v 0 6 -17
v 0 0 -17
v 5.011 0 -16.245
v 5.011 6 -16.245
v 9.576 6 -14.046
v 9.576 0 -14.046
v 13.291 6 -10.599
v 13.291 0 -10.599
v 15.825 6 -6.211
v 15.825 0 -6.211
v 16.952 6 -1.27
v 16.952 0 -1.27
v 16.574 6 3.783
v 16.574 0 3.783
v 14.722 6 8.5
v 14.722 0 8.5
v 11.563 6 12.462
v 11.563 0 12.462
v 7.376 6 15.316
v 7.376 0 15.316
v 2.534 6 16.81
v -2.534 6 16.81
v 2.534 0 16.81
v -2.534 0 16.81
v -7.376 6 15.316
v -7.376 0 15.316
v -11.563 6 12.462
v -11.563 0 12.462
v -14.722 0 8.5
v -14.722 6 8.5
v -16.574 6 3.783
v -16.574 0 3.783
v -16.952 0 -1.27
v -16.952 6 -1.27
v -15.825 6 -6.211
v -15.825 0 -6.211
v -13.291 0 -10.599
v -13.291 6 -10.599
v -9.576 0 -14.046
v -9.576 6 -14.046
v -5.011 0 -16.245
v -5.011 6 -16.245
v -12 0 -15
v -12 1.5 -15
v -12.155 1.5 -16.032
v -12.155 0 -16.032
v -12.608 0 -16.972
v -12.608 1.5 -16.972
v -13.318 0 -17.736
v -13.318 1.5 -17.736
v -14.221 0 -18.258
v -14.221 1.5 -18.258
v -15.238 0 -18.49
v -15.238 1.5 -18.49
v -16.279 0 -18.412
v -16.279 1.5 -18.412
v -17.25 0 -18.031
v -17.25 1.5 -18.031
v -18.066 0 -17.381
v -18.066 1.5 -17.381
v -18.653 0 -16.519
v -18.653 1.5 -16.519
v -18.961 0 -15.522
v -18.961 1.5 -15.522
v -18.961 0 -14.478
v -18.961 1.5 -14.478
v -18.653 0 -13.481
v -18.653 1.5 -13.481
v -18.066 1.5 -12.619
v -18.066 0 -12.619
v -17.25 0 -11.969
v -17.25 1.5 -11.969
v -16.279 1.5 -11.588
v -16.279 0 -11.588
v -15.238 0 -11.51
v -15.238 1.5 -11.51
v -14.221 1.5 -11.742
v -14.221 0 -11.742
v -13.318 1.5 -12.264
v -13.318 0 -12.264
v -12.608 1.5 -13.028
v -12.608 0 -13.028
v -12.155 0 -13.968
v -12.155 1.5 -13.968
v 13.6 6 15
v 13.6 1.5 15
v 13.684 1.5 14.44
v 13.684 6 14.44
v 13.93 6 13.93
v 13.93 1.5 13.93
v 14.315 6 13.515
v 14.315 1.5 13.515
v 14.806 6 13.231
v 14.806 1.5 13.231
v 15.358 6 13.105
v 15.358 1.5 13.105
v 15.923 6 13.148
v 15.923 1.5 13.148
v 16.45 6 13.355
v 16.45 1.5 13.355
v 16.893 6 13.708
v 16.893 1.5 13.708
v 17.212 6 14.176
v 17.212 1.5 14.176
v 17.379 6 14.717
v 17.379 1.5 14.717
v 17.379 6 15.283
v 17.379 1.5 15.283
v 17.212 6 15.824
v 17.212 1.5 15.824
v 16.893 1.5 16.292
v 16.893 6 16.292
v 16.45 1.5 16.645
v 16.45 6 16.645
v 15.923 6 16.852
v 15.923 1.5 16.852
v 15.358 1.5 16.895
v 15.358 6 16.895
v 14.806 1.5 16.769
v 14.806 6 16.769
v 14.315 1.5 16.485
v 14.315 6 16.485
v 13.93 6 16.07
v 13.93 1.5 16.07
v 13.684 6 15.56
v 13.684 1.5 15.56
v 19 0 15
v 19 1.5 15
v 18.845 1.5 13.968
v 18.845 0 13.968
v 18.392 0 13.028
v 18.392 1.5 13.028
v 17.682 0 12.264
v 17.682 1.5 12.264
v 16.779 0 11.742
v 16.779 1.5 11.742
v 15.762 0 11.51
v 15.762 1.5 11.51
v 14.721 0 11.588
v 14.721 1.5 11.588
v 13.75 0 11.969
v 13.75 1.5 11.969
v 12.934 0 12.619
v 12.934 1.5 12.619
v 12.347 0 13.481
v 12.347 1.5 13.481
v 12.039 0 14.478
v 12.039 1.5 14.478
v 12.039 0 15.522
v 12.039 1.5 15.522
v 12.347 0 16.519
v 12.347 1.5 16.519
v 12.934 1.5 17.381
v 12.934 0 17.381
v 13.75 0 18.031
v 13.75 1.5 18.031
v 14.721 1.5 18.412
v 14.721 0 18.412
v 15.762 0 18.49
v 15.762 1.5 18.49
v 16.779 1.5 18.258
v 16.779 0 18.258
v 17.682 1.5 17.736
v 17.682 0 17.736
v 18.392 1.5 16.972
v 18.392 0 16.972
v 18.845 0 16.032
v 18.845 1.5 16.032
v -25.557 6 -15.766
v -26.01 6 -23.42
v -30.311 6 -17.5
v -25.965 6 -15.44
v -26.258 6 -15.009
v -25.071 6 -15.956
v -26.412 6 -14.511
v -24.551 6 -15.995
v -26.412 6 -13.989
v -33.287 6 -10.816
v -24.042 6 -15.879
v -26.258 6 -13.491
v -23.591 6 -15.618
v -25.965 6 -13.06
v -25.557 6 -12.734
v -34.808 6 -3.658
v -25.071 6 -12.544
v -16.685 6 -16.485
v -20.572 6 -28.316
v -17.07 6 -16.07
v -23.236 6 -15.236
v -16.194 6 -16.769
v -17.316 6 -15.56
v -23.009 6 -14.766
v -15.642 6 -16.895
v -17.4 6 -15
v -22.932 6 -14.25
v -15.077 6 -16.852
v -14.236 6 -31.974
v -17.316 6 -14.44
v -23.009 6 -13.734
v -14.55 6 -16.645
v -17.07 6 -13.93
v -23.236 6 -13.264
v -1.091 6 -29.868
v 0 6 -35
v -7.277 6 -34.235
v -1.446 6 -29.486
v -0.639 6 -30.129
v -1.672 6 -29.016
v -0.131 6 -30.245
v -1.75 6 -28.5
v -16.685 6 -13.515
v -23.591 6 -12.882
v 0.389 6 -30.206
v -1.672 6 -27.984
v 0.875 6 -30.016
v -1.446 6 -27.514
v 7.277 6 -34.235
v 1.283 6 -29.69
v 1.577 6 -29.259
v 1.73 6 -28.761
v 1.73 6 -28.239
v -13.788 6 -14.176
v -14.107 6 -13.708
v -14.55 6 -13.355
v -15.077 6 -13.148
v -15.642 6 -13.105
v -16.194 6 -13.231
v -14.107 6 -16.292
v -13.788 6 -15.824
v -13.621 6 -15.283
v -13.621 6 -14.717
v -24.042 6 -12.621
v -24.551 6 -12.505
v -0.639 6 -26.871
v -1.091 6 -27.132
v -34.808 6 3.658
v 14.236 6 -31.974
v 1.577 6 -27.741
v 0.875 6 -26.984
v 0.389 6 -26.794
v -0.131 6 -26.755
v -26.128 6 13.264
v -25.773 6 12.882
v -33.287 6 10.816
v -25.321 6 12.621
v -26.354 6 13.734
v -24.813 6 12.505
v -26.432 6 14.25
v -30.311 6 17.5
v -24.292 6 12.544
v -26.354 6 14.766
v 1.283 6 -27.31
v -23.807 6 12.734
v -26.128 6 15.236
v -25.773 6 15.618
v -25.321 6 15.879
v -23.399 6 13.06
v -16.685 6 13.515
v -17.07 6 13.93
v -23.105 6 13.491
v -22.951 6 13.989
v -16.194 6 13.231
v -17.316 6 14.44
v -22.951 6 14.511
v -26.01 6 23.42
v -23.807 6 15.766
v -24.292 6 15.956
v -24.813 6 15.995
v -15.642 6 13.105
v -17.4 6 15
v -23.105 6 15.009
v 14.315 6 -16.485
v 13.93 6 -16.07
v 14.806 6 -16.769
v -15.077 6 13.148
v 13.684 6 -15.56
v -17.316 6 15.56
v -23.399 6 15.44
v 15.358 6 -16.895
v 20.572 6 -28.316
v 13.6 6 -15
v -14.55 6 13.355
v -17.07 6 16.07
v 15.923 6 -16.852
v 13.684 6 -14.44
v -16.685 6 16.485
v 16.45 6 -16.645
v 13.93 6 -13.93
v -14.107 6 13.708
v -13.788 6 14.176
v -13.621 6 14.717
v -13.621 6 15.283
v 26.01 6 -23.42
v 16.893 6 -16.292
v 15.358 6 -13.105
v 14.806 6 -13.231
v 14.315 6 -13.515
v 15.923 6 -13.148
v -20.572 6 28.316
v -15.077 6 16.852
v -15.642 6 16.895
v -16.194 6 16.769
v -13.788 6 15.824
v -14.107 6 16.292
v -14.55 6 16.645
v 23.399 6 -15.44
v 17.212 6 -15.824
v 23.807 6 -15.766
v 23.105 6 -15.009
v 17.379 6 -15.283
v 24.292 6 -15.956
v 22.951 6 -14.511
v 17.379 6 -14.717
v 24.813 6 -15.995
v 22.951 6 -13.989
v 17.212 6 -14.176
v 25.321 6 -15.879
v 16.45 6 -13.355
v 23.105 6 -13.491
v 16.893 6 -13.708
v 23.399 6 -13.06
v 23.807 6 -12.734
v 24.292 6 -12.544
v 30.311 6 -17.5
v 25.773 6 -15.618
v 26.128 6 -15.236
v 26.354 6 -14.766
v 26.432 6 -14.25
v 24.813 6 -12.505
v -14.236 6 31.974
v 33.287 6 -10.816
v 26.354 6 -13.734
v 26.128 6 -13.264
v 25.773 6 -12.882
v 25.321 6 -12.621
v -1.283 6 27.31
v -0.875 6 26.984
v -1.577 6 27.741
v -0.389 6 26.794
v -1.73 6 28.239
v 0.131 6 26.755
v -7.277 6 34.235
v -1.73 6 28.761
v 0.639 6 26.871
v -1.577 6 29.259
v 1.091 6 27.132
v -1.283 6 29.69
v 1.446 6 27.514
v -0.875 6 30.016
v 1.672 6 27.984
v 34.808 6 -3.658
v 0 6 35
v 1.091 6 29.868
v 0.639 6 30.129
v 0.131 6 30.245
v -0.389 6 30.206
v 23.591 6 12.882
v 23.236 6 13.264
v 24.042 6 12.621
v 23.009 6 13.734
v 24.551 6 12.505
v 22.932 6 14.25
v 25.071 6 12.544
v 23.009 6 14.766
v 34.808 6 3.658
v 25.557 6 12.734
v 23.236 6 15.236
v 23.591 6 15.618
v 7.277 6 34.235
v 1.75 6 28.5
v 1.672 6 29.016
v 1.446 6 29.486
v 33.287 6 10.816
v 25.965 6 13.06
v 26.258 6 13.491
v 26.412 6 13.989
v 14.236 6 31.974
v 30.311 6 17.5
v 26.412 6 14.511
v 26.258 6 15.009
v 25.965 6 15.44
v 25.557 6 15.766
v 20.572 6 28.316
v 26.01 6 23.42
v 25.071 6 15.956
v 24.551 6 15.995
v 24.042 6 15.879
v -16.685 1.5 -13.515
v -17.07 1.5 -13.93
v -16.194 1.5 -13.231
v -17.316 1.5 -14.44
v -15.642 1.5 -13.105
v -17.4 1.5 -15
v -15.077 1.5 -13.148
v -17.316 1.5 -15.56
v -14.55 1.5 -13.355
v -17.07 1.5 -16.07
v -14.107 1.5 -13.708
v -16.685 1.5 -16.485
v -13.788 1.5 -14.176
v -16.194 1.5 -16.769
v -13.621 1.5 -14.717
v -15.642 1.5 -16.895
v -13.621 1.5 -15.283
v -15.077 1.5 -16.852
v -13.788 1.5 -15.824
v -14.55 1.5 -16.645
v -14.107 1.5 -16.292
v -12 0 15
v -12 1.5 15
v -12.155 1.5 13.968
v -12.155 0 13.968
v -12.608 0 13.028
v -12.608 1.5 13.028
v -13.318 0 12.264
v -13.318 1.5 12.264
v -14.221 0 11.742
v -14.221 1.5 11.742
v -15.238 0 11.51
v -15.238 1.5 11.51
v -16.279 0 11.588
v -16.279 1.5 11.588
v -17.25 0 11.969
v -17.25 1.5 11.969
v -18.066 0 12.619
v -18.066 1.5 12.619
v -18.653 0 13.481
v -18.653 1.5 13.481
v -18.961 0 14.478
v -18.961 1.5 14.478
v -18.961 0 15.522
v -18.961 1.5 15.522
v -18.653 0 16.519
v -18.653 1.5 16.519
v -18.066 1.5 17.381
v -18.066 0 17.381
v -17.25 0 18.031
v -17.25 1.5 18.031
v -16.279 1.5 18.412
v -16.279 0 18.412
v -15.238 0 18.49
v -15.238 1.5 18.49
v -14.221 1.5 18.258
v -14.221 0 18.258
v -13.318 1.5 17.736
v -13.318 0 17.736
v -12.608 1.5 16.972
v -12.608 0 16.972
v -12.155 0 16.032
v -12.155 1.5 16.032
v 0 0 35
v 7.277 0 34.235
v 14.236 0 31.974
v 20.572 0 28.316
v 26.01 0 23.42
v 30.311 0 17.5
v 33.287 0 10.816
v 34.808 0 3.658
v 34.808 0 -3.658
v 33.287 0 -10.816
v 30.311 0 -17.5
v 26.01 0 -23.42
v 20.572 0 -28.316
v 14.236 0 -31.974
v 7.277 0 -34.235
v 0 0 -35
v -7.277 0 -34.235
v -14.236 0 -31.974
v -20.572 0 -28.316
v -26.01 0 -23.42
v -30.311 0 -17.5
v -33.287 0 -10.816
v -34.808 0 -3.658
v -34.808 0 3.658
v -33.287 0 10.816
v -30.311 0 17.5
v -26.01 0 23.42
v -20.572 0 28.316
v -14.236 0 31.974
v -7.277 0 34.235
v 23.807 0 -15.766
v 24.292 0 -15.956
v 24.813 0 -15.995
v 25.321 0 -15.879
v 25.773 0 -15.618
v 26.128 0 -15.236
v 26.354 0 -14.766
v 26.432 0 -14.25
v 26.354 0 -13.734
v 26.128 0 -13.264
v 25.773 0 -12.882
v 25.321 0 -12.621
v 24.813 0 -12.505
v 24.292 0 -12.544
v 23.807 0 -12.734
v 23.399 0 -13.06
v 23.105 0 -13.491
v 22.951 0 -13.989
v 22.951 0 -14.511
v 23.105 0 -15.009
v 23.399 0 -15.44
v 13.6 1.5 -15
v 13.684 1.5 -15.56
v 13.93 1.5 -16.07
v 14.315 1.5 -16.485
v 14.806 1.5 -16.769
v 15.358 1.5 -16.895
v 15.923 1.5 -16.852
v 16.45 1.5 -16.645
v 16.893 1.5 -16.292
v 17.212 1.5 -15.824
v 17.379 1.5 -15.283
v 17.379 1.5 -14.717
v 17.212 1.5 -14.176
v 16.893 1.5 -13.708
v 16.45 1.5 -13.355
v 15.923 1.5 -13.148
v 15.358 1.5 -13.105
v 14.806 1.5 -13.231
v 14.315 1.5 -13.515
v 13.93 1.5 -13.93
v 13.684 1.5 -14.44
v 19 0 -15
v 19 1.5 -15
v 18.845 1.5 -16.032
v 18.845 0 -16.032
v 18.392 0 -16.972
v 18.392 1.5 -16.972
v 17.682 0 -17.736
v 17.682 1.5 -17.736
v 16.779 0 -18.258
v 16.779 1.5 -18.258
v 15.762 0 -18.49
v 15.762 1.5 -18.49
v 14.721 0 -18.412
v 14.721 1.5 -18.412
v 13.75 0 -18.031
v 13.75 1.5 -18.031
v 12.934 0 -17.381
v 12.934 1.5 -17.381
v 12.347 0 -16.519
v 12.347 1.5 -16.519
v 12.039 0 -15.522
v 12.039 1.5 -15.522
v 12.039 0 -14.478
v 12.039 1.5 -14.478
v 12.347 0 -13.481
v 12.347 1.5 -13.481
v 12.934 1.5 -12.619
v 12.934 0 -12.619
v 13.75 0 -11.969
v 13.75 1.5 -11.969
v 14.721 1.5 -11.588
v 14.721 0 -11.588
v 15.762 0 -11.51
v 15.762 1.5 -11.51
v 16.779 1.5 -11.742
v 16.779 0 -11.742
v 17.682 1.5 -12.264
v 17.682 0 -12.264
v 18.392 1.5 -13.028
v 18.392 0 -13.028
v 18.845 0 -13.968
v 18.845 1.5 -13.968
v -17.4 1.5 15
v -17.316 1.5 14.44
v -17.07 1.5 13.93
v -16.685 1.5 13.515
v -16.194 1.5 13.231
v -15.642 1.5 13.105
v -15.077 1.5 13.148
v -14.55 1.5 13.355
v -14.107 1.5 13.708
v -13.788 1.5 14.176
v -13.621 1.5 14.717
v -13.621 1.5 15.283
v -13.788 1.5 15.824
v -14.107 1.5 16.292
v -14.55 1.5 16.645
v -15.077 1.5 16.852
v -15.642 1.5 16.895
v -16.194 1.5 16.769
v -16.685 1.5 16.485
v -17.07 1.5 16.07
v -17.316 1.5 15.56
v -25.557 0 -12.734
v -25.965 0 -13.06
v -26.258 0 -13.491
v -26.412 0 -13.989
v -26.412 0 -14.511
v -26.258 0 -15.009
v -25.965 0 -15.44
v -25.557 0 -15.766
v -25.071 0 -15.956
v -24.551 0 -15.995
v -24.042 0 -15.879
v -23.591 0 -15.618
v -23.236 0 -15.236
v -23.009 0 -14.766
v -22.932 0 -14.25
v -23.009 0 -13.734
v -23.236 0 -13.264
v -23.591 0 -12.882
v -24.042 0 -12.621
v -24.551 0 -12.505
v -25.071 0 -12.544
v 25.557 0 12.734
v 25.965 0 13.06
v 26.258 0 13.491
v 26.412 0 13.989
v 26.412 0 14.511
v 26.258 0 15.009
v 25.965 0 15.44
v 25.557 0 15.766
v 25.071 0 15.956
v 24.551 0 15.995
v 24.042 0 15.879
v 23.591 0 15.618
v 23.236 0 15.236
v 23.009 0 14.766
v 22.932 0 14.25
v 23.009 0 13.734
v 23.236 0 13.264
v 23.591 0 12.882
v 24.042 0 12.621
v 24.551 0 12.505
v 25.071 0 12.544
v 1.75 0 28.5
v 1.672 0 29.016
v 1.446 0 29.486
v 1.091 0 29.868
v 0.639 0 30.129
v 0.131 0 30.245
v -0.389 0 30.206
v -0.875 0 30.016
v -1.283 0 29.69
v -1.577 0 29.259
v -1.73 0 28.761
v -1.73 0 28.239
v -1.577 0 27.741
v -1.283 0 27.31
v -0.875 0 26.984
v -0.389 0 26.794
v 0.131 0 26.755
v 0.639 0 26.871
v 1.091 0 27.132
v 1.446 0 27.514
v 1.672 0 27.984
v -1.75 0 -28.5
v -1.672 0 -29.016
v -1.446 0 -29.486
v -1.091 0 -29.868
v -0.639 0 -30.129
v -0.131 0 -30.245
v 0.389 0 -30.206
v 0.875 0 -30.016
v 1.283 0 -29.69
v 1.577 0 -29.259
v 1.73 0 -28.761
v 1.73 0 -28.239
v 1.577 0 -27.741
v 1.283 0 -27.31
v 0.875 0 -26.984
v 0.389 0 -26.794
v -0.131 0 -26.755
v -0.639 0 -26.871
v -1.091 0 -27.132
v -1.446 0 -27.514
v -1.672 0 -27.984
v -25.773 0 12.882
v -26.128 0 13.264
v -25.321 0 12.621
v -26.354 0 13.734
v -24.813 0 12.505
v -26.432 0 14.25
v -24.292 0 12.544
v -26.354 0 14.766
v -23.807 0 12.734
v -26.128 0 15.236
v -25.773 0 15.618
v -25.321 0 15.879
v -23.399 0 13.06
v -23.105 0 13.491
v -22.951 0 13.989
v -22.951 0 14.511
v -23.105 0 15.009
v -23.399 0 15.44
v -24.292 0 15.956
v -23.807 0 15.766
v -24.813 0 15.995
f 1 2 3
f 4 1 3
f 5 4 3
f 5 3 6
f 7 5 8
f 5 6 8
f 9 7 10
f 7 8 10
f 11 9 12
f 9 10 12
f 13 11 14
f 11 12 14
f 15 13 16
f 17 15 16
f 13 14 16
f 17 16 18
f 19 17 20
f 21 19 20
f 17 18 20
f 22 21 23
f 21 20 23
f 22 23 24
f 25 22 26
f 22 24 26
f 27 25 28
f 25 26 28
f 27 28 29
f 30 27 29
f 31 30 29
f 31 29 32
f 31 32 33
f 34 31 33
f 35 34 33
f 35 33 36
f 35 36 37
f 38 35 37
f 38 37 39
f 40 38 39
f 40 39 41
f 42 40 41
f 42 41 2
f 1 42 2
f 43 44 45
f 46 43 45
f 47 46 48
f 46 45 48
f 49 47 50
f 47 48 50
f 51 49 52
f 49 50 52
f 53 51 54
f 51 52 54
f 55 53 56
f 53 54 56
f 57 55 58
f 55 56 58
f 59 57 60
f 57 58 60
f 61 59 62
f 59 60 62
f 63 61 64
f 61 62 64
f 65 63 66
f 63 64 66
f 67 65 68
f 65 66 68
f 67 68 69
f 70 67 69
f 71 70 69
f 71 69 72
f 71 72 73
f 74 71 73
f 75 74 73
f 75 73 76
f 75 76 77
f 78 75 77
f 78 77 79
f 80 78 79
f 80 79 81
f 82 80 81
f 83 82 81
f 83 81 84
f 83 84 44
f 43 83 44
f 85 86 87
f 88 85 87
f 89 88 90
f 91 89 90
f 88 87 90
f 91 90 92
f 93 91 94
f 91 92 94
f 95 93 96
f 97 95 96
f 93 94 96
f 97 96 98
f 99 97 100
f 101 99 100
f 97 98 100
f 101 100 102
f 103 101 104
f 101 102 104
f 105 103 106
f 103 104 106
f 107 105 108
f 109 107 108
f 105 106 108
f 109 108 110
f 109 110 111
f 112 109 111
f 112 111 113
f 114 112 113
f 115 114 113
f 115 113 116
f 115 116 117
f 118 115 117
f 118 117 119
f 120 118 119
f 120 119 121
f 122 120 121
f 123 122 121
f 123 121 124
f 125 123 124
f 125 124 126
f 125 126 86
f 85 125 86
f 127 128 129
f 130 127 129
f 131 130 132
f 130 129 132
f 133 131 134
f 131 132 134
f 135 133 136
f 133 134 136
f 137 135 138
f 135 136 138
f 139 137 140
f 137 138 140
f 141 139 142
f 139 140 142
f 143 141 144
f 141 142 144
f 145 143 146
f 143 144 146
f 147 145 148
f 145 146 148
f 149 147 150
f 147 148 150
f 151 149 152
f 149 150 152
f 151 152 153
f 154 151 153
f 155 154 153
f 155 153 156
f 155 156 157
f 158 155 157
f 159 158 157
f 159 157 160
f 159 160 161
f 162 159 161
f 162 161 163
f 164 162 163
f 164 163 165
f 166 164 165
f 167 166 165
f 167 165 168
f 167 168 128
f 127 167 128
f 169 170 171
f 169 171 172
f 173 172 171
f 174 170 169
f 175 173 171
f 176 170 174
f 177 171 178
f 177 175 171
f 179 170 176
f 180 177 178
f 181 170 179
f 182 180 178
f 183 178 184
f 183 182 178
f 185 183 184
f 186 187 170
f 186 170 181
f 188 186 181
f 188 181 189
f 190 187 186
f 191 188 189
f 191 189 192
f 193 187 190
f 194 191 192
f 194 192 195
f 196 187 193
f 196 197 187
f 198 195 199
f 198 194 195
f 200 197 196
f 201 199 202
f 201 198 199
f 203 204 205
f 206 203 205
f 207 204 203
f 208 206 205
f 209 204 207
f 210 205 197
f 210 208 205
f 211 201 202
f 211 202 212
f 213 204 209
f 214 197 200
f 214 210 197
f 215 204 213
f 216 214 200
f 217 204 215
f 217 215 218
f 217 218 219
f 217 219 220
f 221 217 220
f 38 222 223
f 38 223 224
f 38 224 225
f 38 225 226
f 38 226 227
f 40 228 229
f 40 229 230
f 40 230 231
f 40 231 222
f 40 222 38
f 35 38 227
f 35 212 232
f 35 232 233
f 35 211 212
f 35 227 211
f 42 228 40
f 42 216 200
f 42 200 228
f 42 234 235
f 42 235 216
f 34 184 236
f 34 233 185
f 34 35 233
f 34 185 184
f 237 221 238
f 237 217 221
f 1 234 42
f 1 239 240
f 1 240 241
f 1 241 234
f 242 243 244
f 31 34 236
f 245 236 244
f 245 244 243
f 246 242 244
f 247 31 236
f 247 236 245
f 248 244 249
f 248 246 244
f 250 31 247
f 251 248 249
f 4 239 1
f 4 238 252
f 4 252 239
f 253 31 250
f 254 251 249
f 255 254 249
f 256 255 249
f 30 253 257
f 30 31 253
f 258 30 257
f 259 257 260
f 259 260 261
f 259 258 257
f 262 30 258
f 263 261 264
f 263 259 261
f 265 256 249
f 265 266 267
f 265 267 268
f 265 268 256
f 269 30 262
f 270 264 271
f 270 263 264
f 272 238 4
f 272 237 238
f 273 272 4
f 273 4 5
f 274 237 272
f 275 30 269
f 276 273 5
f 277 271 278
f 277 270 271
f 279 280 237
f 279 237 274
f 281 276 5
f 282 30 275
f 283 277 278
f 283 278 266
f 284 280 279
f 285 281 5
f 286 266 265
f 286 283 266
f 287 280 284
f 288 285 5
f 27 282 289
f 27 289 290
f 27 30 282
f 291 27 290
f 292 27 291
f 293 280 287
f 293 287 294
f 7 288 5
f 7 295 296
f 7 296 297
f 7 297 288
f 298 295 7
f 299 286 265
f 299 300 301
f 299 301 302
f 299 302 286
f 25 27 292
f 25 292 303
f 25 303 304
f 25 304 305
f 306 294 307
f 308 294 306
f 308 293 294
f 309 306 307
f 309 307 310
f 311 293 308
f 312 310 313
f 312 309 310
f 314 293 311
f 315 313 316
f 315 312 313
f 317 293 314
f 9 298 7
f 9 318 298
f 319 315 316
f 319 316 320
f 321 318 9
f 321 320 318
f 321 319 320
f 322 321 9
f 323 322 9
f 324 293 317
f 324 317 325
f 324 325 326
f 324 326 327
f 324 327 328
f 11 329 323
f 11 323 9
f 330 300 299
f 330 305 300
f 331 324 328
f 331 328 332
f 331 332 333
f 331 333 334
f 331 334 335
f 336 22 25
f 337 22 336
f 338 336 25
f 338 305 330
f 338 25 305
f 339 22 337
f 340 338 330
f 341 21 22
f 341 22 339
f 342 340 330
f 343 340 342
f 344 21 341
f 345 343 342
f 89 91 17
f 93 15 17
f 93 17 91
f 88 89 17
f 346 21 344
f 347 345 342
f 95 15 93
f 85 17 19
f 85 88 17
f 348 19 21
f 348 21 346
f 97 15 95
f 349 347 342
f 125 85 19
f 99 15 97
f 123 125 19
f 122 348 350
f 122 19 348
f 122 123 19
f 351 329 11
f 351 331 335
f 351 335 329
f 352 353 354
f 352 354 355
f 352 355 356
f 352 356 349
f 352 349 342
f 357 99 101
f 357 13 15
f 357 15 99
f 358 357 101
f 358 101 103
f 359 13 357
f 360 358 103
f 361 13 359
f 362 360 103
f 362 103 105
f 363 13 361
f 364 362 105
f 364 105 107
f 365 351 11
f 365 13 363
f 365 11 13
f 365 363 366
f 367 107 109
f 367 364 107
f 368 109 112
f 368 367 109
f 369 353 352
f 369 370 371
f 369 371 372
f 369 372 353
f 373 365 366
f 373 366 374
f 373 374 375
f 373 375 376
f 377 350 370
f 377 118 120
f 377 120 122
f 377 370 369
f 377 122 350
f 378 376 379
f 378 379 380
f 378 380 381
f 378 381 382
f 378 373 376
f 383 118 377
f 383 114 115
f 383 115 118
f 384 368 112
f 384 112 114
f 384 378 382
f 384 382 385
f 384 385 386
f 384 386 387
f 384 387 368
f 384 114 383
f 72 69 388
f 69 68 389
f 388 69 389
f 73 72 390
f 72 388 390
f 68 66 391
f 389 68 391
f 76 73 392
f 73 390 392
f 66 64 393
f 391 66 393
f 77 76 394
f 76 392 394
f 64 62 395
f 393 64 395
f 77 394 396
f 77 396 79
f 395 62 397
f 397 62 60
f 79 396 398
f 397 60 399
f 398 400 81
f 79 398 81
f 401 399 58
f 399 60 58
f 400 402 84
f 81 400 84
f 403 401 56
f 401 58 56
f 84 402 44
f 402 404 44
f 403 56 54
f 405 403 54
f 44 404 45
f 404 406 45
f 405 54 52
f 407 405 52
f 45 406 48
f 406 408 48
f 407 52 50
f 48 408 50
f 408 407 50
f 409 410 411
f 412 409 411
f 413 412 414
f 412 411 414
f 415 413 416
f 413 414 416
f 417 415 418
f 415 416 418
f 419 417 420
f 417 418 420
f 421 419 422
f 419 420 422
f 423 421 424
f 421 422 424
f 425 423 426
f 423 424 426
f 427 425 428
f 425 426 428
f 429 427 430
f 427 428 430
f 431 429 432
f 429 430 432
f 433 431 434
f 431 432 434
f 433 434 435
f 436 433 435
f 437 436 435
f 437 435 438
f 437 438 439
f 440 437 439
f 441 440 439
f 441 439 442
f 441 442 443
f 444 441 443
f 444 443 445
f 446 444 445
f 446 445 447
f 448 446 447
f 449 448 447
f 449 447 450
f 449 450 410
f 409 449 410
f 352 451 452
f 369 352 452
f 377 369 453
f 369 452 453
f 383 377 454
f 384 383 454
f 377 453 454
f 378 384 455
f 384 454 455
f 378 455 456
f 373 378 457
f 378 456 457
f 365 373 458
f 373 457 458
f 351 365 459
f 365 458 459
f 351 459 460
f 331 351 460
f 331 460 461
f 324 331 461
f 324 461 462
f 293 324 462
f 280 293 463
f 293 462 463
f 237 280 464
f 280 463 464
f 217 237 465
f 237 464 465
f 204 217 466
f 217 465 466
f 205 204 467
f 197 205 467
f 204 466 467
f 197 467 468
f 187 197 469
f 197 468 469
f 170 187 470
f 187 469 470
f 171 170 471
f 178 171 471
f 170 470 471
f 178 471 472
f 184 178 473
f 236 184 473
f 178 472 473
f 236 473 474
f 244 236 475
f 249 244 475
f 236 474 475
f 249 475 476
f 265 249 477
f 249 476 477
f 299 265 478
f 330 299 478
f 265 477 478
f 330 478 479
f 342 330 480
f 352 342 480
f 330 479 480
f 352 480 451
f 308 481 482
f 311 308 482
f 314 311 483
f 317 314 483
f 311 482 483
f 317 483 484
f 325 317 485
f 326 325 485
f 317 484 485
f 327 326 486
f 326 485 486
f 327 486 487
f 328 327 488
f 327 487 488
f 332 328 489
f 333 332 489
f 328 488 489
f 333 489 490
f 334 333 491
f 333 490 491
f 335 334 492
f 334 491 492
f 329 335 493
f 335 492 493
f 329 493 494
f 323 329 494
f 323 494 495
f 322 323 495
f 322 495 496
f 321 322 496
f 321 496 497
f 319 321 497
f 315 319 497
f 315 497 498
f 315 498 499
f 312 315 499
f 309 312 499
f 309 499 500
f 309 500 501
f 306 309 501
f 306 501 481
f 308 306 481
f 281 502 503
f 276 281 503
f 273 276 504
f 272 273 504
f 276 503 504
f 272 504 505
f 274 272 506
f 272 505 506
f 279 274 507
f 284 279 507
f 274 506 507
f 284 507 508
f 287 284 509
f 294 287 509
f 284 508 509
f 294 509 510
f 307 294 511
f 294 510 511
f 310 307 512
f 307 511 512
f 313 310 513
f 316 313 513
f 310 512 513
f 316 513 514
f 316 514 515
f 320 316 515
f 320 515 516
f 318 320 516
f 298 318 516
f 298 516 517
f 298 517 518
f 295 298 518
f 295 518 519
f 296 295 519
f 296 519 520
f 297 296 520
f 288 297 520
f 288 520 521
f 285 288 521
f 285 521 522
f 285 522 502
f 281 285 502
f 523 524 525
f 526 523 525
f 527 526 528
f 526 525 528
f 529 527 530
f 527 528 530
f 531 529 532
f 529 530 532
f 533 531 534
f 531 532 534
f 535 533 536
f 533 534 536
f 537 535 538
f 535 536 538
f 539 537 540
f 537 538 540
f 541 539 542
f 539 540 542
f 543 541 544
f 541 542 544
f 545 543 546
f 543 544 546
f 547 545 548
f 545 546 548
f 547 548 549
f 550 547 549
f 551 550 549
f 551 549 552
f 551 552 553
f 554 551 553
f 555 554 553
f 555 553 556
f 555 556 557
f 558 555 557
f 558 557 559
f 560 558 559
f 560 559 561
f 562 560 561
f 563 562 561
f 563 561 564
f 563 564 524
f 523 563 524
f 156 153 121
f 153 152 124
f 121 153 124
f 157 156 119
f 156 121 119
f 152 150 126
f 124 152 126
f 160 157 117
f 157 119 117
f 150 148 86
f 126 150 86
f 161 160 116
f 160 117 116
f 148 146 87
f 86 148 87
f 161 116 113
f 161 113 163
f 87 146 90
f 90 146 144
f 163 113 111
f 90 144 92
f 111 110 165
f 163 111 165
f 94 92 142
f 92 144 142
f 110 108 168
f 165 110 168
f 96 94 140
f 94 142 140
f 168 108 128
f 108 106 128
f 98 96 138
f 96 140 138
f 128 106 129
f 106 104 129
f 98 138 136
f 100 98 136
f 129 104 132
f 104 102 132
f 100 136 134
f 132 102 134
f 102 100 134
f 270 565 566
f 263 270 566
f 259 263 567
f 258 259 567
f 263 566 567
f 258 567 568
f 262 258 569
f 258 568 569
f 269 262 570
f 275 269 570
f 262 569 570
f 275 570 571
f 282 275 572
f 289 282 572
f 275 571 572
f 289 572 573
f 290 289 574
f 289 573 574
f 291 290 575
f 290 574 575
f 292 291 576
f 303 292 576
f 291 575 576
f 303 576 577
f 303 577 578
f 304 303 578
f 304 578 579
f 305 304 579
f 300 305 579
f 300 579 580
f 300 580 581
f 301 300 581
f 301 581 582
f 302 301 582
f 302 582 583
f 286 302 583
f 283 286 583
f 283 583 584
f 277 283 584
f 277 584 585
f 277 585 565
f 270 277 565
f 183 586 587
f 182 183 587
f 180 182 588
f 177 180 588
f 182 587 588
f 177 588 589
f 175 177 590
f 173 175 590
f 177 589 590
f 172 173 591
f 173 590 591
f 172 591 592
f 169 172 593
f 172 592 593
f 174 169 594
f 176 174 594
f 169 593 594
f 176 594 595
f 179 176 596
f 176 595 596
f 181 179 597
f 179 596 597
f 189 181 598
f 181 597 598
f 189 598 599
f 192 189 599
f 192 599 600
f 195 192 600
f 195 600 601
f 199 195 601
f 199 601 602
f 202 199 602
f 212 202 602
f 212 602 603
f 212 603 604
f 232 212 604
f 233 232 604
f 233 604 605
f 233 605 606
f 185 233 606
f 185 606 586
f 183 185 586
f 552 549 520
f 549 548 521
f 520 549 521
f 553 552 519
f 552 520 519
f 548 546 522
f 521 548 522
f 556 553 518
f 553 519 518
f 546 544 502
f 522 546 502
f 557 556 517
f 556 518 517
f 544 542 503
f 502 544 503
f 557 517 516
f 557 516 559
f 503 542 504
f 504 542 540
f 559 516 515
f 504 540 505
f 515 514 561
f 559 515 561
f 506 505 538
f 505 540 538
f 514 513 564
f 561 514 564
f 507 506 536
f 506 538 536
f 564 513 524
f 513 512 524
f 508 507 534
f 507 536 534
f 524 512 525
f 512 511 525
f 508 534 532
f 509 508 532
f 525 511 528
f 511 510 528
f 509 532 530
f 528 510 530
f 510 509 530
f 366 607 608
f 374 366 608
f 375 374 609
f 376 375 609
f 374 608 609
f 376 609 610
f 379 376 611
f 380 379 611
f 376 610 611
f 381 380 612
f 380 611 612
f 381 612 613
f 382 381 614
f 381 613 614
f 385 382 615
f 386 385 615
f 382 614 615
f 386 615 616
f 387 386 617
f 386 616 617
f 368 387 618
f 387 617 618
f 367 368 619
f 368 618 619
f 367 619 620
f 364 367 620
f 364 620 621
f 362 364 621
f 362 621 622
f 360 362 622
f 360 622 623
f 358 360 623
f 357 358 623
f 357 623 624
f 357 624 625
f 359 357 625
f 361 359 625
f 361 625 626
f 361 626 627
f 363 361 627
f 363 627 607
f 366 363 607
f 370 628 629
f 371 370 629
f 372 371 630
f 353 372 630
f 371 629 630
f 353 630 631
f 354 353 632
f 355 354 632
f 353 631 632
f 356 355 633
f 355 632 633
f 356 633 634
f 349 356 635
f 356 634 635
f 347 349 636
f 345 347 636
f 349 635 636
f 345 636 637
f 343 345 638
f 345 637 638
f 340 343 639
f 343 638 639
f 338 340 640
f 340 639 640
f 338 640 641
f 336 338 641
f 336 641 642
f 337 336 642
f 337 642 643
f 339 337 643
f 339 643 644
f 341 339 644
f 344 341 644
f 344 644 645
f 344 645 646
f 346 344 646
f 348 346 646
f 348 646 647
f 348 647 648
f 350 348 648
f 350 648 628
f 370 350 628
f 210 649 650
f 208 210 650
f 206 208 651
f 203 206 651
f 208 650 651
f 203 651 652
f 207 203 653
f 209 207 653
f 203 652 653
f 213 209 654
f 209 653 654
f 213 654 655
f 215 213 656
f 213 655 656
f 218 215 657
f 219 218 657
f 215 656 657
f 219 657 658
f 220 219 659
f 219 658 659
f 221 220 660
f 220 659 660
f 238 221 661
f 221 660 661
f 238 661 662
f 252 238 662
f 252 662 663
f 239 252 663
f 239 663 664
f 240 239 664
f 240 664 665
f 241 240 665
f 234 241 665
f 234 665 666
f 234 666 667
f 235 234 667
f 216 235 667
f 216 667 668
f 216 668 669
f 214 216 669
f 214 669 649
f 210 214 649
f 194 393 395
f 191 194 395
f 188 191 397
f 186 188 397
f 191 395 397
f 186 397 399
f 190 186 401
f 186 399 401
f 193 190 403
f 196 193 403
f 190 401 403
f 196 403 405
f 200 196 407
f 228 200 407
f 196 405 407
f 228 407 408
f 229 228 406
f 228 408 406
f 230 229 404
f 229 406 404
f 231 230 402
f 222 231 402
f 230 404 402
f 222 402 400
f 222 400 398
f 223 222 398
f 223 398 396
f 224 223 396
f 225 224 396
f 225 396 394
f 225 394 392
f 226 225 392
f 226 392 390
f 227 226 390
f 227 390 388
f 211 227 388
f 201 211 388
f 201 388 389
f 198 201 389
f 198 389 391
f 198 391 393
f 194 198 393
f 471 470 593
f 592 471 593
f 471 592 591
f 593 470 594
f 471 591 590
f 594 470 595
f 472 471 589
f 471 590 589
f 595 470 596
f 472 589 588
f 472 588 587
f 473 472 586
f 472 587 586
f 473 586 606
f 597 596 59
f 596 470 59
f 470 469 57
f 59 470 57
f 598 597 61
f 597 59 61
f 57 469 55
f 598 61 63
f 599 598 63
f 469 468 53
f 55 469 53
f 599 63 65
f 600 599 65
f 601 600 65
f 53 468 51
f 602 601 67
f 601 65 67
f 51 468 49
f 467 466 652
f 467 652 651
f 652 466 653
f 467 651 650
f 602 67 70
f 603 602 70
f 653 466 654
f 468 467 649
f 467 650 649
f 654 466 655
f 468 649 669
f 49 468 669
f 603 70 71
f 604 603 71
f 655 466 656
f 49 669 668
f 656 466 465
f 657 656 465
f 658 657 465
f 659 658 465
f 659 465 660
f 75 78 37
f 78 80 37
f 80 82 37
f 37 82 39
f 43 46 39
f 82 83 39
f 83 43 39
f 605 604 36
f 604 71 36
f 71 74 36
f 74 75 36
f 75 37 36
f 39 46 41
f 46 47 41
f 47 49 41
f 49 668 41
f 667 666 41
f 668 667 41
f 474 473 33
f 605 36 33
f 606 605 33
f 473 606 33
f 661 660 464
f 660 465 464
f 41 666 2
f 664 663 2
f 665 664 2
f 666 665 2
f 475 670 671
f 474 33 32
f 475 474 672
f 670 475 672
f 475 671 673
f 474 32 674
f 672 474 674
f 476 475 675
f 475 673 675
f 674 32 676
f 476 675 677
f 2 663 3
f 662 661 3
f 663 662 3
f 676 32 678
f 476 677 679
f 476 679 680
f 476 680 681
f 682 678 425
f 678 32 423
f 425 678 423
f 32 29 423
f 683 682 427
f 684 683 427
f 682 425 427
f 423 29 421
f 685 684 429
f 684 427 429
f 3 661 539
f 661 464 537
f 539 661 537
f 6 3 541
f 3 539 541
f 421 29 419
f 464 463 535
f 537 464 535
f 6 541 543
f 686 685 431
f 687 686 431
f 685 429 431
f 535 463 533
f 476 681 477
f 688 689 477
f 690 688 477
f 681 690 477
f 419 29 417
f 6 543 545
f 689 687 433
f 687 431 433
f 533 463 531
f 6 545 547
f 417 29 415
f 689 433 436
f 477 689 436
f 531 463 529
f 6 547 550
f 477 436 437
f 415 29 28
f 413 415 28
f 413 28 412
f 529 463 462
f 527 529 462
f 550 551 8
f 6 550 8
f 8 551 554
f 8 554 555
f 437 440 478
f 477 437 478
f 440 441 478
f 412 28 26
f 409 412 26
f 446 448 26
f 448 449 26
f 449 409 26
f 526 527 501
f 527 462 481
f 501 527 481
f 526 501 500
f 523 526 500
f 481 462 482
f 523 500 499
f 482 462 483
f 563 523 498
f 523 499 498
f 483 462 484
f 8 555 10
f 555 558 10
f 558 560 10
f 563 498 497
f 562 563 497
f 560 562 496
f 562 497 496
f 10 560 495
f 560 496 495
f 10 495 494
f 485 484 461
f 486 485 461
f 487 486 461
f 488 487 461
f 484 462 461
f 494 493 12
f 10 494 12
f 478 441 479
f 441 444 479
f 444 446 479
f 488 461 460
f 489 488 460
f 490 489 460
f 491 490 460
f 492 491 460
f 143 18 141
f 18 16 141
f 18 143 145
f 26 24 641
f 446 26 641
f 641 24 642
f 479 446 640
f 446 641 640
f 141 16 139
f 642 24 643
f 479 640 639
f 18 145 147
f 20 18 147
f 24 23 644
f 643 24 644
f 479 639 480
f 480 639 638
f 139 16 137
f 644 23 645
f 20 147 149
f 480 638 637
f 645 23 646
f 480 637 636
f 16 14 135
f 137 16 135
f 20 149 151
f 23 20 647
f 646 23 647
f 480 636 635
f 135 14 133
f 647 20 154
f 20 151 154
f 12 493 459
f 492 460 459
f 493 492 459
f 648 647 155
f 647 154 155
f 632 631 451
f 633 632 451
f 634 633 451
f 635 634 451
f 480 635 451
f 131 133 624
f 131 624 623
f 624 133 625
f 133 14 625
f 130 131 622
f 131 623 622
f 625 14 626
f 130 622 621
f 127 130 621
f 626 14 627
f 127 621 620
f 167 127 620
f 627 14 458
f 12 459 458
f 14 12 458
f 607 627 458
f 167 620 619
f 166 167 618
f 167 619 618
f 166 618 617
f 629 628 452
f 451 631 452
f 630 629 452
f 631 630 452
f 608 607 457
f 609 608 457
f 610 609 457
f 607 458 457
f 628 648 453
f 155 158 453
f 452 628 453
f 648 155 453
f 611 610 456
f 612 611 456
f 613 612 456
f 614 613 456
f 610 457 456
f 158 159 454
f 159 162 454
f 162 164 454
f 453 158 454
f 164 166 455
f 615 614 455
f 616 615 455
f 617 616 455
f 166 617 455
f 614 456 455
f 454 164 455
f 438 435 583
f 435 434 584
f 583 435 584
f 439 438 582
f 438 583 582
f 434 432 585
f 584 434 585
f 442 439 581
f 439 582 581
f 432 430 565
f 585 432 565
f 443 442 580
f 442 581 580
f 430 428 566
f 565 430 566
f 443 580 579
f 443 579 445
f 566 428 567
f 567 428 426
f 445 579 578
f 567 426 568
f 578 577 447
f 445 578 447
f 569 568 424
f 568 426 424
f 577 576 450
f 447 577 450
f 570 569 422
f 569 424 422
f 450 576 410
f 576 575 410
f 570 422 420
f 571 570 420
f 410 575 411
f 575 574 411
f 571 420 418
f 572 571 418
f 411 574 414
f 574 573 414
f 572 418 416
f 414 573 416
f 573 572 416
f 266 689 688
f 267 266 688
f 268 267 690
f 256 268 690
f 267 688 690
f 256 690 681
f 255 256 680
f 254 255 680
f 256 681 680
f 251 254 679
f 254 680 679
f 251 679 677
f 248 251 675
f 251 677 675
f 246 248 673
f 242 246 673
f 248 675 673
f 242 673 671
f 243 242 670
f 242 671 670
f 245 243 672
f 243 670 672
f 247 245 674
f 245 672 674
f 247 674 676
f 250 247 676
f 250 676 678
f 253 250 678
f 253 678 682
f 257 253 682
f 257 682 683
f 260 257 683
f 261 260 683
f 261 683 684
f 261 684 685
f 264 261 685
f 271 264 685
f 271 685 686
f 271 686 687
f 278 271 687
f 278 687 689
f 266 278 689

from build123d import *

# Parameters (mm, degrees)
SKETCH_1_R               = 35
EXTRUDE_1_DEPTH          = 6
HOLE_WIZARD_1_D          = 3.5
PATTERN_CIRCULAR_1_COUNT = 6
HOLE_WIZARD_2_D          = 3.8
SKETCH_8_R               = 11
CUT_EXTRUDE_1_DEPTH      = 10
HOLE_WIZARD_3_D          = 7
HOLE_WIZARD_3_DEPTH      = 1.5
SKETCH_13_R              = 17
CUT_EXTRUDE_2_DEPTH      = 10


with BuildPart() as part:
    # 草图1 → 凸台-拉伸1 (new body)
    with BuildSketch(Plane(origin=(0, 0, 0), x_dir=(1, 0, 0), z_dir=(0, 1, 0))):
        with Locations(Location((0, 0, 0), (0, 0, 270))):
            Circle(SKETCH_1_R)
    extrude(amount=EXTRUDE_1_DEPTH)

    # 孔1 (through all)
    with Locations(Plane(origin=(0, 6, 0), x_dir=(1, 0, 0), z_dir=(0, 1, 0))):
        with Locations((0, 28.5)):
            hole_wizard_1 = Hole(HOLE_WIZARD_1_D / 2)

    # 阵列(圆周)1: 孔1 ×6 about axis
    pattern_circular_1_axis = Axis((0, 0, 0), (0, 1, 0))
    for i in range(1, PATTERN_CIRCULAR_1_COUNT):
        add(hole_wizard_1.rotate(pattern_circular_1_axis, i * 360 / PATTERN_CIRCULAR_1_COUNT), mode=Mode.SUBTRACT)

    # 孔2 (through all)
    with Locations(Plane(origin=(0, 6, 0), x_dir=(1, 0, 0), z_dir=(0, 1, 0))):
        with Locations((-15.5, 15), (15.5, 15), (15.5, -15), (-15.5, -15)):
            Hole(HOLE_WIZARD_2_D / 2)

    # 草图8 → 切除-拉伸1 (cut)
    with BuildSketch(Plane(origin=(0, 6, 0), x_dir=(1, 0, 0), z_dir=(0, 1, 0))):
        with Locations(Location((0, 0, 0), (0, 0, 270))):
            Circle(SKETCH_8_R)
    extrude(amount=-CUT_EXTRUDE_1_DEPTH, mode=Mode.SUBTRACT)

    # 孔3
    with Locations(Plane(origin=(0, 0, 0), x_dir=(-1, 0, 0), z_dir=(0, -1, 0))):
        with Locations((-15.5, 15), (15.5, 15), (15.5, -15), (-15.5, -15)):
            Hole(HOLE_WIZARD_3_D / 2, depth=HOLE_WIZARD_3_DEPTH)

    # 草图13 → 切除-拉伸2 (cut)
    with BuildSketch(Plane.XZ):
        with Locations(Location((0, 0, 0), (0, 0, 270))):
            Circle(SKETCH_13_R)
    extrude(amount=-CUT_EXTRUDE_2_DEPTH, mode=Mode.SUBTRACT)


solid = part.part
